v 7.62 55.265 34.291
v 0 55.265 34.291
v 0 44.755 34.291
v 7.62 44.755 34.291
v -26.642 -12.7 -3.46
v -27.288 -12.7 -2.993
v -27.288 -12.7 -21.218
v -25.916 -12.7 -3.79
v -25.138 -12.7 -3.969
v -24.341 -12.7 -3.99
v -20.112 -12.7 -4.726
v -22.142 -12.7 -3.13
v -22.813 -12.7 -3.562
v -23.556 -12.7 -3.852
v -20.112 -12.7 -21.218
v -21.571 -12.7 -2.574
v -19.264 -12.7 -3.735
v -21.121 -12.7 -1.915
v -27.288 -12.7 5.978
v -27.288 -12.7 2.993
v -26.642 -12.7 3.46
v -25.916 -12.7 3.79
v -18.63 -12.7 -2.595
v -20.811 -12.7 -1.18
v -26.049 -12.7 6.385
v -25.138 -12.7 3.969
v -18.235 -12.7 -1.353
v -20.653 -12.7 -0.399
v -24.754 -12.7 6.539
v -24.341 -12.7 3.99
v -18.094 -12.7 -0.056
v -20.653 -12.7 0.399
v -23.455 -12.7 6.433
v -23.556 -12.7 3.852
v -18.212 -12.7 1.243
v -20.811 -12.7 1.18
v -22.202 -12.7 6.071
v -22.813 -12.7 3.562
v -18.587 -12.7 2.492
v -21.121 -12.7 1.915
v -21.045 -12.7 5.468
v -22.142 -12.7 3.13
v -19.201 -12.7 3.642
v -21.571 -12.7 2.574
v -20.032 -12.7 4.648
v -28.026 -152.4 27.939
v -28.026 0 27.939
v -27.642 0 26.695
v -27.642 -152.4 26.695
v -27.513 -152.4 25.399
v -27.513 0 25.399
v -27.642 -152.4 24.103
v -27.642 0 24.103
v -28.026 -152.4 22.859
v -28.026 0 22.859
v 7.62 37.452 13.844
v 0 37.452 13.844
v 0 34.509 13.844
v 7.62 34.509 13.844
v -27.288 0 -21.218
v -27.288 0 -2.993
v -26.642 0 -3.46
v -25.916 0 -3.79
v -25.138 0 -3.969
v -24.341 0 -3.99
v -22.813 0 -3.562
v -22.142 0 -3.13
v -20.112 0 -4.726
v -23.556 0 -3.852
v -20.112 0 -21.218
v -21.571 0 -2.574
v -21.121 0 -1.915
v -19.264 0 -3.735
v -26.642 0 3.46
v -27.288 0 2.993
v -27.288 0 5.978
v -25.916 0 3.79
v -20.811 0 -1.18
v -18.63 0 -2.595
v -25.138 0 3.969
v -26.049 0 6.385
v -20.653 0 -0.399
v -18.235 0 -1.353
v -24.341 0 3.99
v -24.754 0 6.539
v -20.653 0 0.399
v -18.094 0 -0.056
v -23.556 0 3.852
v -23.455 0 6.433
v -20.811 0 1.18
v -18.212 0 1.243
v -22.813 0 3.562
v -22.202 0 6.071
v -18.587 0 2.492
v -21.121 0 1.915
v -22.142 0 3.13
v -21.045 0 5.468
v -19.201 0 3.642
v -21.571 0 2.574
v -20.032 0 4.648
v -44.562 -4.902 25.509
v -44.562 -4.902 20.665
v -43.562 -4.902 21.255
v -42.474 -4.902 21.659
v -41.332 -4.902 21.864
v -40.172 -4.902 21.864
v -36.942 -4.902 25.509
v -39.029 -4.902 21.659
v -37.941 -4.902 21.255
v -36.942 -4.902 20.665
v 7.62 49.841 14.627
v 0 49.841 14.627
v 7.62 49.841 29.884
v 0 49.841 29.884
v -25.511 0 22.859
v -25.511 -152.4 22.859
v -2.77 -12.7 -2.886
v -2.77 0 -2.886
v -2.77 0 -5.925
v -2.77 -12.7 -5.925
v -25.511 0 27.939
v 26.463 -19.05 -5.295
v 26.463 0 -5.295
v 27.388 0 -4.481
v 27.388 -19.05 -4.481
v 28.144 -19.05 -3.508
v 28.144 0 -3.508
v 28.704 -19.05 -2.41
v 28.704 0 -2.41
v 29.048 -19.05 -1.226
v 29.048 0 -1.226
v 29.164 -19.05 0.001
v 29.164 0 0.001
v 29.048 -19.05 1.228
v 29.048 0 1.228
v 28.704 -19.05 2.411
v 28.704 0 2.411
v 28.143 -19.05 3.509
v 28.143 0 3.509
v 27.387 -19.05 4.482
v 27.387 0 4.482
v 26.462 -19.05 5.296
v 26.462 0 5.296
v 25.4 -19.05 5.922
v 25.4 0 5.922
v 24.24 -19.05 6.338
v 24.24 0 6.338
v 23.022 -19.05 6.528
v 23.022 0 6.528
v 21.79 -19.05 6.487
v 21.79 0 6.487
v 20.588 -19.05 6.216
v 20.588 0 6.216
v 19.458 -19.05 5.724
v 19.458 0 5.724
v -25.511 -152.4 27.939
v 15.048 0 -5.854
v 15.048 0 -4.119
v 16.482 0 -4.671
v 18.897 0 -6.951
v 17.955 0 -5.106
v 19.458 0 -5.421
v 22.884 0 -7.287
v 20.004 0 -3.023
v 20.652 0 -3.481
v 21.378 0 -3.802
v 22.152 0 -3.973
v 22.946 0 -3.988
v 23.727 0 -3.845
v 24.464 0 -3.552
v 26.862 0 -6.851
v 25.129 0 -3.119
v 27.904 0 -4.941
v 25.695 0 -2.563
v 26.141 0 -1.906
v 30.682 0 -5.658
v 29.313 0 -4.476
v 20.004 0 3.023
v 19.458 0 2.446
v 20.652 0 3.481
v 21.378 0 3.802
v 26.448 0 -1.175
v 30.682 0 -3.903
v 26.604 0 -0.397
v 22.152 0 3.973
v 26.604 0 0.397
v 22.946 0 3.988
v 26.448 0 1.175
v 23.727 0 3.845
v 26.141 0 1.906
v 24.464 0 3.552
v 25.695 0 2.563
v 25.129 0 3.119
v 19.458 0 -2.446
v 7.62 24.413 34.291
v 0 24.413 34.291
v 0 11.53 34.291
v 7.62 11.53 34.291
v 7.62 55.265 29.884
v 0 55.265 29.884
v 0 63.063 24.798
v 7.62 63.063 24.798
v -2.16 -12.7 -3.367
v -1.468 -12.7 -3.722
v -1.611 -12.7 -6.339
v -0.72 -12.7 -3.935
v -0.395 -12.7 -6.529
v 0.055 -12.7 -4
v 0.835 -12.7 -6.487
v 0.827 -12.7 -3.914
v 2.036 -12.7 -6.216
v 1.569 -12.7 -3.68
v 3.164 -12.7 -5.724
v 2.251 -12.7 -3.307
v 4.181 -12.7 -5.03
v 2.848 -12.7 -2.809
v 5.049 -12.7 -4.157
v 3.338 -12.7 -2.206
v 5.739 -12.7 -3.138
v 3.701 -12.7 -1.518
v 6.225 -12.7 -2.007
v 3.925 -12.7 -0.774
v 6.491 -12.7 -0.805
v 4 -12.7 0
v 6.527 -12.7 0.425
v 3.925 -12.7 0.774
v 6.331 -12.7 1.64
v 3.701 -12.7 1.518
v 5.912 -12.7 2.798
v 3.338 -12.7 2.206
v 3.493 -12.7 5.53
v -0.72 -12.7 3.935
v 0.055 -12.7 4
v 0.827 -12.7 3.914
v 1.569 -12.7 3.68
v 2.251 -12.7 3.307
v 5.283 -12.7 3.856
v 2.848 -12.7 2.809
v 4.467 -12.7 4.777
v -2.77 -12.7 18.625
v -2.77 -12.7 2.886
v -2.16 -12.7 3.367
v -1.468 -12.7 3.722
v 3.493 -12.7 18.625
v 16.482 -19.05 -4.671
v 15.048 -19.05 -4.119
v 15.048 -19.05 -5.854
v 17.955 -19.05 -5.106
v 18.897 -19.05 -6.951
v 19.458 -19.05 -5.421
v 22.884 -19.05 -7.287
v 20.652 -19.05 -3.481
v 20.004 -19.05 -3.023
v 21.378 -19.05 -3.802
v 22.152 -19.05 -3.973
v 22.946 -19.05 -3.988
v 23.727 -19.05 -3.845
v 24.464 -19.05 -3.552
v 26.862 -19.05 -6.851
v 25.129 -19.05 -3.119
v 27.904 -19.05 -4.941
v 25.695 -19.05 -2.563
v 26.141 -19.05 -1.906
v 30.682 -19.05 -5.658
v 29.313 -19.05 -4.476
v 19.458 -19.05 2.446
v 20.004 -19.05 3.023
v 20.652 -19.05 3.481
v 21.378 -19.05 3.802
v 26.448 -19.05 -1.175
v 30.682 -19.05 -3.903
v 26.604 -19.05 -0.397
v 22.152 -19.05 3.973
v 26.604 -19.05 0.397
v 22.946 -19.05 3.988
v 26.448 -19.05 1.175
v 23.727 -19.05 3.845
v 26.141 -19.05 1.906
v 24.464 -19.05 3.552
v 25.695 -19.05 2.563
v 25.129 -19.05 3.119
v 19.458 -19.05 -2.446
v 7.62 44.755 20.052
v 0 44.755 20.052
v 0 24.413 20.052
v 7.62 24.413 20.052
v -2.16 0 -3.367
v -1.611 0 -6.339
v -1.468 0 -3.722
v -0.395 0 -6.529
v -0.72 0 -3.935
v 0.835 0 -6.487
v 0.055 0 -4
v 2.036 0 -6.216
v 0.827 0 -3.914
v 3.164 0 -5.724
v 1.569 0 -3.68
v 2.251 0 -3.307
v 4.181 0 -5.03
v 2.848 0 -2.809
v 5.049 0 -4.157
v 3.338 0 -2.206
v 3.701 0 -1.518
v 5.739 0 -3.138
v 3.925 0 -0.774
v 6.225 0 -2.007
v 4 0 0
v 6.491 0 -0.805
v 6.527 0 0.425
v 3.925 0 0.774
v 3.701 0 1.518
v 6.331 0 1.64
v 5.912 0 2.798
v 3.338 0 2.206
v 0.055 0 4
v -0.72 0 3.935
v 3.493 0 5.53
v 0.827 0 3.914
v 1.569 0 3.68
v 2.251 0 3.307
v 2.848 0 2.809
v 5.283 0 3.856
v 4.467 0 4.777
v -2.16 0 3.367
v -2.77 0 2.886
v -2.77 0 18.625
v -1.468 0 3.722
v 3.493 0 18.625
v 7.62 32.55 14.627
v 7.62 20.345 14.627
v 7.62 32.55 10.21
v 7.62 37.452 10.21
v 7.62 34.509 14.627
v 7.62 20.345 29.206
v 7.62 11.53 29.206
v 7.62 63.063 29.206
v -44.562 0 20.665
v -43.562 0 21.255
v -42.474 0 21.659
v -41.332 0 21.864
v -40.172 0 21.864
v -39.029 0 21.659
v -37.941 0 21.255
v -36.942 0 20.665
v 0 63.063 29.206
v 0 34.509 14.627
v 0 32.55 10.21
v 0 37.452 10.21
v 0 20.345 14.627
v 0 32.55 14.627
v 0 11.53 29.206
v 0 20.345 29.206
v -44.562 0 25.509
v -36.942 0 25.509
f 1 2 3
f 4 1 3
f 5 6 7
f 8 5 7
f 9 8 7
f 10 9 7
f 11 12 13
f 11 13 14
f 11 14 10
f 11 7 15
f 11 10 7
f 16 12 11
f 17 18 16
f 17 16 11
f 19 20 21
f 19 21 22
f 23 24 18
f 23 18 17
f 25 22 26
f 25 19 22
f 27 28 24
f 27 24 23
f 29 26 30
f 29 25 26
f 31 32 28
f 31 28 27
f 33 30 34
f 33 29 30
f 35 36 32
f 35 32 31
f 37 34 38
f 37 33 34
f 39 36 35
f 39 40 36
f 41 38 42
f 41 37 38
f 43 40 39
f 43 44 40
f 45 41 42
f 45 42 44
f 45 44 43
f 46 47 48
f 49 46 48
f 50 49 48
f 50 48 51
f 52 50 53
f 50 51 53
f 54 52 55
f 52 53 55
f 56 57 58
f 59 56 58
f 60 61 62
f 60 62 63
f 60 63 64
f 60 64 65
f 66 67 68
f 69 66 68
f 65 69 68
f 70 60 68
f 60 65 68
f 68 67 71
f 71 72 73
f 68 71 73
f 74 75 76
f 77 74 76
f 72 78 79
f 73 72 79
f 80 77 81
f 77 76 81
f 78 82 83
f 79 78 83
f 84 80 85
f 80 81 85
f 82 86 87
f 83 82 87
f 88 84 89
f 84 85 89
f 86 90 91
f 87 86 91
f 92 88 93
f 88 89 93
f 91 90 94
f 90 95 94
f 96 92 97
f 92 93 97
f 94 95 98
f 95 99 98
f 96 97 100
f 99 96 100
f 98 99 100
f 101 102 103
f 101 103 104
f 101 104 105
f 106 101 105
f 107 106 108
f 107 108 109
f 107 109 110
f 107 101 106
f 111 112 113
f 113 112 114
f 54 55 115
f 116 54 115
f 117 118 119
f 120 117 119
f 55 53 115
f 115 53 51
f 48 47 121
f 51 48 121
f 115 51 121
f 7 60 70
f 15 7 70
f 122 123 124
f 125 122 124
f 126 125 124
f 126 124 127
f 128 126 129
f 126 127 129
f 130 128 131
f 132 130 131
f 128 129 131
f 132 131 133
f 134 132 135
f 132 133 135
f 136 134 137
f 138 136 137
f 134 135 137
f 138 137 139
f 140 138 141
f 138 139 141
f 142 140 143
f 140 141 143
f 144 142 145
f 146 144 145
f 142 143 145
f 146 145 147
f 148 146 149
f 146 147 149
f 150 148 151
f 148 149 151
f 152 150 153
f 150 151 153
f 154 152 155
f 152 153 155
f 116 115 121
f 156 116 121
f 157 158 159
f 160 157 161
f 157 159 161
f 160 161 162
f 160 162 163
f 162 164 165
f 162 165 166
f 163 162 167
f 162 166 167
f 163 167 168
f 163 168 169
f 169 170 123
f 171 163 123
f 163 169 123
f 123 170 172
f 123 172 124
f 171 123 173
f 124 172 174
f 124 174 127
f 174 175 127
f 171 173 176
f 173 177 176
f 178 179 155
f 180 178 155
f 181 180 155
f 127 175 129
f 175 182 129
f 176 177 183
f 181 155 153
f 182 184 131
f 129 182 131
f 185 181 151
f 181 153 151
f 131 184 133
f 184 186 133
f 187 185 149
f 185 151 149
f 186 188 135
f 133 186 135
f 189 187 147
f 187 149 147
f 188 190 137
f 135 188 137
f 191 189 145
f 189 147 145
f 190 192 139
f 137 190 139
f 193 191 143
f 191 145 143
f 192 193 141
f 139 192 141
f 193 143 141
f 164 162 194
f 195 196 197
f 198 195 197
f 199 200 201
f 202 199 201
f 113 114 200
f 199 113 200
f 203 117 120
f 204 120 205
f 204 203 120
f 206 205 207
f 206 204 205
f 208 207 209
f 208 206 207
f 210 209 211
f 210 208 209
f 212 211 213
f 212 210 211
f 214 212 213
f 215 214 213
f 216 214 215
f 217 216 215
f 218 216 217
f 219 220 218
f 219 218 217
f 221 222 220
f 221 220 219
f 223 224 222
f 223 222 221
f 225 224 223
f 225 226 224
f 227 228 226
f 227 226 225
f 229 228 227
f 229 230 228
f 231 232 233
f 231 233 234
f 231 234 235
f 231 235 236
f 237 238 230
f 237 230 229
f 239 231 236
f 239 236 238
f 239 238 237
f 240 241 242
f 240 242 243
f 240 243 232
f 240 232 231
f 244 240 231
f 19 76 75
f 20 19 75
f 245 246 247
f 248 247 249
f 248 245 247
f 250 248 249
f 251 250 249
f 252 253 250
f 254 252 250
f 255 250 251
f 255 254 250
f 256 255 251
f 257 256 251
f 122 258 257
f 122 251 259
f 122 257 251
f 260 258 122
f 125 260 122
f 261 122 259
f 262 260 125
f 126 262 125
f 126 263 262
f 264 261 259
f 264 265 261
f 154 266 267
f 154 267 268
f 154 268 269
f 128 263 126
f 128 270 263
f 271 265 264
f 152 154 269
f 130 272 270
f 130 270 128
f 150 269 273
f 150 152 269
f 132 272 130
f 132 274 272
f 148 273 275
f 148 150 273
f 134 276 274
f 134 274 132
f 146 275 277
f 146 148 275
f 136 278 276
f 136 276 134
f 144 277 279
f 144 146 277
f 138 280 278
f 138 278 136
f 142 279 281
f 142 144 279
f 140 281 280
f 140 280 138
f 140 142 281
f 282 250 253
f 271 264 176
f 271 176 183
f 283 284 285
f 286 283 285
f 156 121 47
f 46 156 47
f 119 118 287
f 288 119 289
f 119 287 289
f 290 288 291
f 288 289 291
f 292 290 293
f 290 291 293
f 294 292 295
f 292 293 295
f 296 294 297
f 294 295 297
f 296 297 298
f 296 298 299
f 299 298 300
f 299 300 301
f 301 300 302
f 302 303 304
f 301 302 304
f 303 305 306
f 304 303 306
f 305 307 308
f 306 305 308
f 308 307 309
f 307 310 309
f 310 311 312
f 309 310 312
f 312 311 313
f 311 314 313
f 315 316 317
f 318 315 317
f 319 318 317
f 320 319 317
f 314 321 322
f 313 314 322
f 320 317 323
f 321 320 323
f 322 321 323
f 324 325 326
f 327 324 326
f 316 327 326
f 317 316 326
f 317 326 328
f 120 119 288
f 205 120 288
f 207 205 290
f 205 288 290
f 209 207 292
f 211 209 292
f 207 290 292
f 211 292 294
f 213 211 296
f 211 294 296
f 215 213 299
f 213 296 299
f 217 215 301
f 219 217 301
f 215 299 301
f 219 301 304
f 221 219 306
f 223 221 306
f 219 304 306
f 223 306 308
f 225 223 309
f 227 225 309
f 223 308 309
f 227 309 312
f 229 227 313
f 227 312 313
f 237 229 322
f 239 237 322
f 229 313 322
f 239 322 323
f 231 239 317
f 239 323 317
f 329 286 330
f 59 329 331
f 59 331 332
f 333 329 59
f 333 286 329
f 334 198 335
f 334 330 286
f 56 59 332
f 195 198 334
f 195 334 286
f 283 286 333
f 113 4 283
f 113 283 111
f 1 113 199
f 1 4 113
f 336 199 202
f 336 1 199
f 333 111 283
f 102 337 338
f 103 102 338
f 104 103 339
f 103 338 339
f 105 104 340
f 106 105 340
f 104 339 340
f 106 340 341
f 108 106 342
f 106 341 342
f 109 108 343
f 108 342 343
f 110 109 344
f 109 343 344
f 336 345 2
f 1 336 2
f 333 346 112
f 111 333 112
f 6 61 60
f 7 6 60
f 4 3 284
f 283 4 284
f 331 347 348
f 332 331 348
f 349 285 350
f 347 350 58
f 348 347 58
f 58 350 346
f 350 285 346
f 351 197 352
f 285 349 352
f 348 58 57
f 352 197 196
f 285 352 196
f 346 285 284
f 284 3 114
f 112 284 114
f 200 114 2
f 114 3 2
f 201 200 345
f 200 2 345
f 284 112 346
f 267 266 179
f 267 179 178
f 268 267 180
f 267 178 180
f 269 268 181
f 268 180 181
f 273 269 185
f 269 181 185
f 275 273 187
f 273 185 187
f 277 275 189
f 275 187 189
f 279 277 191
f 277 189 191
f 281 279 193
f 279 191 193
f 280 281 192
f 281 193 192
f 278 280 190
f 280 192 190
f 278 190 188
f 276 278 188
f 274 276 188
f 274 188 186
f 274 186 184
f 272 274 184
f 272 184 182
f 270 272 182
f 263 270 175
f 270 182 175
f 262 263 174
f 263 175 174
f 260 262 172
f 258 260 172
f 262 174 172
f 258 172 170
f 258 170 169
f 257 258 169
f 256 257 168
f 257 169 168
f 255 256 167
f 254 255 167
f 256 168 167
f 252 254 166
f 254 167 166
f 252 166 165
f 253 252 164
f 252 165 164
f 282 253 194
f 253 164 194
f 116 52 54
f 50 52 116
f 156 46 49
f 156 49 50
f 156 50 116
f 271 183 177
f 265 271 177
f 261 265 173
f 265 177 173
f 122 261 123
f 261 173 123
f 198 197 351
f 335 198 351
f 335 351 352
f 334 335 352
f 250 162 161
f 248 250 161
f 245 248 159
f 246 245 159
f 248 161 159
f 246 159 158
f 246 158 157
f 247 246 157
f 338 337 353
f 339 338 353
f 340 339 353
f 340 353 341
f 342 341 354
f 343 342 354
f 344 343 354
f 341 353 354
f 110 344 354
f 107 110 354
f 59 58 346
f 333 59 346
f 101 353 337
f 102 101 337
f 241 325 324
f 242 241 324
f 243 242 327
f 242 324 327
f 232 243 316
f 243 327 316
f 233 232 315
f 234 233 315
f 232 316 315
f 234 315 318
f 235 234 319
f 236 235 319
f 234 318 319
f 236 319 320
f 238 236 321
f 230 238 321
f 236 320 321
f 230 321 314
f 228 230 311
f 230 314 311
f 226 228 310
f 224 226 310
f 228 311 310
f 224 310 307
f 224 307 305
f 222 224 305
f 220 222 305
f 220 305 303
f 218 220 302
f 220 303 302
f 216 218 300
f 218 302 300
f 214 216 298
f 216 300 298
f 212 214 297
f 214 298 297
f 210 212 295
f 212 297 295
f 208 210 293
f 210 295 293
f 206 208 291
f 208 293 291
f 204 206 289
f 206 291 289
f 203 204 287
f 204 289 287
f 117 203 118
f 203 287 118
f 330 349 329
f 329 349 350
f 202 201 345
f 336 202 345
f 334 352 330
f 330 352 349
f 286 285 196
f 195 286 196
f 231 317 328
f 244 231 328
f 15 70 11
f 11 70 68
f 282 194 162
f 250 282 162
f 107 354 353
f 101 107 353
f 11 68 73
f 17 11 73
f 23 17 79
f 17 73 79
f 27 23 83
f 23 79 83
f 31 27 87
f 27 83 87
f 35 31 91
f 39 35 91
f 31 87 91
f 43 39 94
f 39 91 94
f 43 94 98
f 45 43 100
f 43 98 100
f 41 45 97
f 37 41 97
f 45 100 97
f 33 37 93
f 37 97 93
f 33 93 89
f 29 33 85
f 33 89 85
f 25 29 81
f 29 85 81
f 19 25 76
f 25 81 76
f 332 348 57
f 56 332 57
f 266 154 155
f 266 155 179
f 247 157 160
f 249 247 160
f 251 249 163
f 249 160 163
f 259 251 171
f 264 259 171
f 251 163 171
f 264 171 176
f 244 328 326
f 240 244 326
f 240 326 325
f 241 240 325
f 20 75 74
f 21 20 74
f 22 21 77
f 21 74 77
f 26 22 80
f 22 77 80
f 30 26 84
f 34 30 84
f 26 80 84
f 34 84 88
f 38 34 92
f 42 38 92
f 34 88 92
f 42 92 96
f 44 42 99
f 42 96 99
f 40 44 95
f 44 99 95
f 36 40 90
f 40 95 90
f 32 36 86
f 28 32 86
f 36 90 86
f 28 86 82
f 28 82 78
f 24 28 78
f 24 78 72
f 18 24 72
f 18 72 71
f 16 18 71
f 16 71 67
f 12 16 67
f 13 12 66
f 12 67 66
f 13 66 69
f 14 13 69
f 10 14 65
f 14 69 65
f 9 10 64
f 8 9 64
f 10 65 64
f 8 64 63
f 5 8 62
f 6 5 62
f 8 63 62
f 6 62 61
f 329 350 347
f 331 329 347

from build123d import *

# Parameters (mm, degrees)
F3_DEPTH  = 12.7
F4_DEPTH  = 12.7
F5_DEPTH  = 19.05
F7_DEPTH  = 152.4
F9_DEPTH  = 7.62
F11_DEPTH = 4.9022


with BuildPart() as f3:
    # F1 (on Front) → F3 (new body)
    with BuildSketch(Plane.XZ):
        with BuildLine():
            ThreePointArc((-27.288161, 2.993028), (-20.633271, 0), (-27.288161, -2.993028))
            Line((-27.288161, -2.993028), (-27.288161, -5.977655))
            Line((-27.288161, -5.977655), (-27.288161, -21.217655))
            Line((-27.288161, -21.217655), (-20.112188, -21.217655))
            Line((-20.112188, -21.217655), (-20.112188, -4.725825))
            ThreePointArc((-20.112188, -4.725825), (-19.20121, 3.642172), (-27.288161, 5.977655))
            Line((-27.288161, 5.977655), (-27.288161, 2.993028))
        make_face()
    extrude(amount=F3_DEPTH)


with BuildPart() as f4:
    # F0 (on Front) → F4 (new body)
    with BuildSketch(Plane.XZ):
        with BuildLine():
            ThreePointArc((-2.770346, 2.886032), (4.0005, 0), (-2.770346, -2.886032))
            Line((-2.770346, -2.886032), (-2.770346, -5.924806))
            ThreePointArc((-2.770346, -5.924806), (5.73865, -3.137839), (3.492884, 5.529729))
            Line((3.492884, 5.529729), (3.492884, 18.624806))
            Line((3.492884, 18.624806), (-2.770346, 18.624806))
            Line((-2.770346, 18.624806), (-2.770346, 5.924806))
            Line((-2.770346, 5.924806), (-2.770346, 2.886032))
        make_face()
    extrude(amount=F4_DEPTH)


with BuildPart() as f5:
    # F2 (on Front) → F5 (new body)
    with BuildSketch(Plane.XZ):
        with BuildLine():
            ThreePointArc((19.458382, 2.446432), (26.624157, 0), (19.458382, -2.446432))
            Line((19.458382, -2.446432), (19.458382, -5.420756))
            ThreePointArc((19.458382, -5.420756), (22.966455, -5.68159), (26.462917, -5.295113))
            ThreePointArc((26.462917, -5.295113), (28.143292, 3.508813), (19.458382, 5.723563))
            Line((19.458382, 5.723563), (19.458382, 2.446432))
        make_face()
        with BuildLine():
            ThreePointArc((26.462917, -5.295113), (22.966455, -5.68159), (19.458382, -5.420756))
            ThreePointArc((19.458382, -5.420756), (17.213965, -4.90315), (15.048106, -4.11933))
            Line((15.048106, -4.11933), (15.048106, -5.854257))
            ThreePointArc((15.048106, -5.854257), (22.884073, -7.287287), (30.681542, -5.657738))
            Line((30.681542, -5.657738), (30.681542, -3.90315))
            ThreePointArc((30.681542, -3.90315), (28.612806, -4.722107), (26.462917, -5.295113))
        make_face()
    extrude(amount=F5_DEPTH)


with BuildPart() as f7:
    # F6 (on Front) → F7 (new body)
    with BuildSketch(Plane.XZ):
        with BuildLine():
            Line((-25.511014, 27.939167), (-28.02622, 27.939167))
            ThreePointArc((-28.02622, 27.939167), (-27.51287, 25.399167), (-28.02622, 22.859167))
            Line((-28.02622, 22.859167), (-25.511014, 22.859167))
            Line((-25.511014, 22.859167), (-25.511014, 27.939167))
        make_face()
    extrude(amount=F7_DEPTH)


with BuildPart() as f9:
    # F8 (on Right) → F9 (new body)
    with BuildSketch(Plane.YZ):
        Polygon((24.413109, 34.291358), (11.52972, 34.291358), (11.52972, 29.205807), (20.344674, 29.205807), (20.344674, 20.051818), (20.344674, 14.627233), (32.549993, 14.627233), (32.549993, 10.210037), (37.452193, 10.210037), (37.452193, 13.843876), (34.509048, 13.843876), (34.509048, 14.627233), (44.755312, 14.627233), (49.84086, 14.627233), (49.84086, 29.88388), (55.265452, 29.88388), (63.063295, 24.798328), (63.063295, 29.205807), (55.265452, 34.291358), (49.84086, 34.291358), (44.755312, 34.291358), (44.755312, 20.051818), (24.413109, 20.051818), (24.413109, 29.205807), align=None)
    extrude(amount=F9_DEPTH)


with BuildPart() as f11:
    # F10 (on Front) → F11 (new body)
    with BuildSketch(Plane.XZ):
        with BuildLine():
            Line((-36.941752, 25.509252), (-44.561752, 25.509252))
            Line((-44.561752, 25.509252), (-44.561752, 20.665456))
            ThreePointArc((-44.561752, 20.665456), (-40.751752, 21.88975), (-36.941752, 20.665456))
            Line((-36.941752, 20.665456), (-36.941752, 25.509252))
        make_face()
    extrude(amount=F11_DEPTH)


solid = Compound([f3.part, f4.part, f5.part, f7.part, f9.part, f11.part])
